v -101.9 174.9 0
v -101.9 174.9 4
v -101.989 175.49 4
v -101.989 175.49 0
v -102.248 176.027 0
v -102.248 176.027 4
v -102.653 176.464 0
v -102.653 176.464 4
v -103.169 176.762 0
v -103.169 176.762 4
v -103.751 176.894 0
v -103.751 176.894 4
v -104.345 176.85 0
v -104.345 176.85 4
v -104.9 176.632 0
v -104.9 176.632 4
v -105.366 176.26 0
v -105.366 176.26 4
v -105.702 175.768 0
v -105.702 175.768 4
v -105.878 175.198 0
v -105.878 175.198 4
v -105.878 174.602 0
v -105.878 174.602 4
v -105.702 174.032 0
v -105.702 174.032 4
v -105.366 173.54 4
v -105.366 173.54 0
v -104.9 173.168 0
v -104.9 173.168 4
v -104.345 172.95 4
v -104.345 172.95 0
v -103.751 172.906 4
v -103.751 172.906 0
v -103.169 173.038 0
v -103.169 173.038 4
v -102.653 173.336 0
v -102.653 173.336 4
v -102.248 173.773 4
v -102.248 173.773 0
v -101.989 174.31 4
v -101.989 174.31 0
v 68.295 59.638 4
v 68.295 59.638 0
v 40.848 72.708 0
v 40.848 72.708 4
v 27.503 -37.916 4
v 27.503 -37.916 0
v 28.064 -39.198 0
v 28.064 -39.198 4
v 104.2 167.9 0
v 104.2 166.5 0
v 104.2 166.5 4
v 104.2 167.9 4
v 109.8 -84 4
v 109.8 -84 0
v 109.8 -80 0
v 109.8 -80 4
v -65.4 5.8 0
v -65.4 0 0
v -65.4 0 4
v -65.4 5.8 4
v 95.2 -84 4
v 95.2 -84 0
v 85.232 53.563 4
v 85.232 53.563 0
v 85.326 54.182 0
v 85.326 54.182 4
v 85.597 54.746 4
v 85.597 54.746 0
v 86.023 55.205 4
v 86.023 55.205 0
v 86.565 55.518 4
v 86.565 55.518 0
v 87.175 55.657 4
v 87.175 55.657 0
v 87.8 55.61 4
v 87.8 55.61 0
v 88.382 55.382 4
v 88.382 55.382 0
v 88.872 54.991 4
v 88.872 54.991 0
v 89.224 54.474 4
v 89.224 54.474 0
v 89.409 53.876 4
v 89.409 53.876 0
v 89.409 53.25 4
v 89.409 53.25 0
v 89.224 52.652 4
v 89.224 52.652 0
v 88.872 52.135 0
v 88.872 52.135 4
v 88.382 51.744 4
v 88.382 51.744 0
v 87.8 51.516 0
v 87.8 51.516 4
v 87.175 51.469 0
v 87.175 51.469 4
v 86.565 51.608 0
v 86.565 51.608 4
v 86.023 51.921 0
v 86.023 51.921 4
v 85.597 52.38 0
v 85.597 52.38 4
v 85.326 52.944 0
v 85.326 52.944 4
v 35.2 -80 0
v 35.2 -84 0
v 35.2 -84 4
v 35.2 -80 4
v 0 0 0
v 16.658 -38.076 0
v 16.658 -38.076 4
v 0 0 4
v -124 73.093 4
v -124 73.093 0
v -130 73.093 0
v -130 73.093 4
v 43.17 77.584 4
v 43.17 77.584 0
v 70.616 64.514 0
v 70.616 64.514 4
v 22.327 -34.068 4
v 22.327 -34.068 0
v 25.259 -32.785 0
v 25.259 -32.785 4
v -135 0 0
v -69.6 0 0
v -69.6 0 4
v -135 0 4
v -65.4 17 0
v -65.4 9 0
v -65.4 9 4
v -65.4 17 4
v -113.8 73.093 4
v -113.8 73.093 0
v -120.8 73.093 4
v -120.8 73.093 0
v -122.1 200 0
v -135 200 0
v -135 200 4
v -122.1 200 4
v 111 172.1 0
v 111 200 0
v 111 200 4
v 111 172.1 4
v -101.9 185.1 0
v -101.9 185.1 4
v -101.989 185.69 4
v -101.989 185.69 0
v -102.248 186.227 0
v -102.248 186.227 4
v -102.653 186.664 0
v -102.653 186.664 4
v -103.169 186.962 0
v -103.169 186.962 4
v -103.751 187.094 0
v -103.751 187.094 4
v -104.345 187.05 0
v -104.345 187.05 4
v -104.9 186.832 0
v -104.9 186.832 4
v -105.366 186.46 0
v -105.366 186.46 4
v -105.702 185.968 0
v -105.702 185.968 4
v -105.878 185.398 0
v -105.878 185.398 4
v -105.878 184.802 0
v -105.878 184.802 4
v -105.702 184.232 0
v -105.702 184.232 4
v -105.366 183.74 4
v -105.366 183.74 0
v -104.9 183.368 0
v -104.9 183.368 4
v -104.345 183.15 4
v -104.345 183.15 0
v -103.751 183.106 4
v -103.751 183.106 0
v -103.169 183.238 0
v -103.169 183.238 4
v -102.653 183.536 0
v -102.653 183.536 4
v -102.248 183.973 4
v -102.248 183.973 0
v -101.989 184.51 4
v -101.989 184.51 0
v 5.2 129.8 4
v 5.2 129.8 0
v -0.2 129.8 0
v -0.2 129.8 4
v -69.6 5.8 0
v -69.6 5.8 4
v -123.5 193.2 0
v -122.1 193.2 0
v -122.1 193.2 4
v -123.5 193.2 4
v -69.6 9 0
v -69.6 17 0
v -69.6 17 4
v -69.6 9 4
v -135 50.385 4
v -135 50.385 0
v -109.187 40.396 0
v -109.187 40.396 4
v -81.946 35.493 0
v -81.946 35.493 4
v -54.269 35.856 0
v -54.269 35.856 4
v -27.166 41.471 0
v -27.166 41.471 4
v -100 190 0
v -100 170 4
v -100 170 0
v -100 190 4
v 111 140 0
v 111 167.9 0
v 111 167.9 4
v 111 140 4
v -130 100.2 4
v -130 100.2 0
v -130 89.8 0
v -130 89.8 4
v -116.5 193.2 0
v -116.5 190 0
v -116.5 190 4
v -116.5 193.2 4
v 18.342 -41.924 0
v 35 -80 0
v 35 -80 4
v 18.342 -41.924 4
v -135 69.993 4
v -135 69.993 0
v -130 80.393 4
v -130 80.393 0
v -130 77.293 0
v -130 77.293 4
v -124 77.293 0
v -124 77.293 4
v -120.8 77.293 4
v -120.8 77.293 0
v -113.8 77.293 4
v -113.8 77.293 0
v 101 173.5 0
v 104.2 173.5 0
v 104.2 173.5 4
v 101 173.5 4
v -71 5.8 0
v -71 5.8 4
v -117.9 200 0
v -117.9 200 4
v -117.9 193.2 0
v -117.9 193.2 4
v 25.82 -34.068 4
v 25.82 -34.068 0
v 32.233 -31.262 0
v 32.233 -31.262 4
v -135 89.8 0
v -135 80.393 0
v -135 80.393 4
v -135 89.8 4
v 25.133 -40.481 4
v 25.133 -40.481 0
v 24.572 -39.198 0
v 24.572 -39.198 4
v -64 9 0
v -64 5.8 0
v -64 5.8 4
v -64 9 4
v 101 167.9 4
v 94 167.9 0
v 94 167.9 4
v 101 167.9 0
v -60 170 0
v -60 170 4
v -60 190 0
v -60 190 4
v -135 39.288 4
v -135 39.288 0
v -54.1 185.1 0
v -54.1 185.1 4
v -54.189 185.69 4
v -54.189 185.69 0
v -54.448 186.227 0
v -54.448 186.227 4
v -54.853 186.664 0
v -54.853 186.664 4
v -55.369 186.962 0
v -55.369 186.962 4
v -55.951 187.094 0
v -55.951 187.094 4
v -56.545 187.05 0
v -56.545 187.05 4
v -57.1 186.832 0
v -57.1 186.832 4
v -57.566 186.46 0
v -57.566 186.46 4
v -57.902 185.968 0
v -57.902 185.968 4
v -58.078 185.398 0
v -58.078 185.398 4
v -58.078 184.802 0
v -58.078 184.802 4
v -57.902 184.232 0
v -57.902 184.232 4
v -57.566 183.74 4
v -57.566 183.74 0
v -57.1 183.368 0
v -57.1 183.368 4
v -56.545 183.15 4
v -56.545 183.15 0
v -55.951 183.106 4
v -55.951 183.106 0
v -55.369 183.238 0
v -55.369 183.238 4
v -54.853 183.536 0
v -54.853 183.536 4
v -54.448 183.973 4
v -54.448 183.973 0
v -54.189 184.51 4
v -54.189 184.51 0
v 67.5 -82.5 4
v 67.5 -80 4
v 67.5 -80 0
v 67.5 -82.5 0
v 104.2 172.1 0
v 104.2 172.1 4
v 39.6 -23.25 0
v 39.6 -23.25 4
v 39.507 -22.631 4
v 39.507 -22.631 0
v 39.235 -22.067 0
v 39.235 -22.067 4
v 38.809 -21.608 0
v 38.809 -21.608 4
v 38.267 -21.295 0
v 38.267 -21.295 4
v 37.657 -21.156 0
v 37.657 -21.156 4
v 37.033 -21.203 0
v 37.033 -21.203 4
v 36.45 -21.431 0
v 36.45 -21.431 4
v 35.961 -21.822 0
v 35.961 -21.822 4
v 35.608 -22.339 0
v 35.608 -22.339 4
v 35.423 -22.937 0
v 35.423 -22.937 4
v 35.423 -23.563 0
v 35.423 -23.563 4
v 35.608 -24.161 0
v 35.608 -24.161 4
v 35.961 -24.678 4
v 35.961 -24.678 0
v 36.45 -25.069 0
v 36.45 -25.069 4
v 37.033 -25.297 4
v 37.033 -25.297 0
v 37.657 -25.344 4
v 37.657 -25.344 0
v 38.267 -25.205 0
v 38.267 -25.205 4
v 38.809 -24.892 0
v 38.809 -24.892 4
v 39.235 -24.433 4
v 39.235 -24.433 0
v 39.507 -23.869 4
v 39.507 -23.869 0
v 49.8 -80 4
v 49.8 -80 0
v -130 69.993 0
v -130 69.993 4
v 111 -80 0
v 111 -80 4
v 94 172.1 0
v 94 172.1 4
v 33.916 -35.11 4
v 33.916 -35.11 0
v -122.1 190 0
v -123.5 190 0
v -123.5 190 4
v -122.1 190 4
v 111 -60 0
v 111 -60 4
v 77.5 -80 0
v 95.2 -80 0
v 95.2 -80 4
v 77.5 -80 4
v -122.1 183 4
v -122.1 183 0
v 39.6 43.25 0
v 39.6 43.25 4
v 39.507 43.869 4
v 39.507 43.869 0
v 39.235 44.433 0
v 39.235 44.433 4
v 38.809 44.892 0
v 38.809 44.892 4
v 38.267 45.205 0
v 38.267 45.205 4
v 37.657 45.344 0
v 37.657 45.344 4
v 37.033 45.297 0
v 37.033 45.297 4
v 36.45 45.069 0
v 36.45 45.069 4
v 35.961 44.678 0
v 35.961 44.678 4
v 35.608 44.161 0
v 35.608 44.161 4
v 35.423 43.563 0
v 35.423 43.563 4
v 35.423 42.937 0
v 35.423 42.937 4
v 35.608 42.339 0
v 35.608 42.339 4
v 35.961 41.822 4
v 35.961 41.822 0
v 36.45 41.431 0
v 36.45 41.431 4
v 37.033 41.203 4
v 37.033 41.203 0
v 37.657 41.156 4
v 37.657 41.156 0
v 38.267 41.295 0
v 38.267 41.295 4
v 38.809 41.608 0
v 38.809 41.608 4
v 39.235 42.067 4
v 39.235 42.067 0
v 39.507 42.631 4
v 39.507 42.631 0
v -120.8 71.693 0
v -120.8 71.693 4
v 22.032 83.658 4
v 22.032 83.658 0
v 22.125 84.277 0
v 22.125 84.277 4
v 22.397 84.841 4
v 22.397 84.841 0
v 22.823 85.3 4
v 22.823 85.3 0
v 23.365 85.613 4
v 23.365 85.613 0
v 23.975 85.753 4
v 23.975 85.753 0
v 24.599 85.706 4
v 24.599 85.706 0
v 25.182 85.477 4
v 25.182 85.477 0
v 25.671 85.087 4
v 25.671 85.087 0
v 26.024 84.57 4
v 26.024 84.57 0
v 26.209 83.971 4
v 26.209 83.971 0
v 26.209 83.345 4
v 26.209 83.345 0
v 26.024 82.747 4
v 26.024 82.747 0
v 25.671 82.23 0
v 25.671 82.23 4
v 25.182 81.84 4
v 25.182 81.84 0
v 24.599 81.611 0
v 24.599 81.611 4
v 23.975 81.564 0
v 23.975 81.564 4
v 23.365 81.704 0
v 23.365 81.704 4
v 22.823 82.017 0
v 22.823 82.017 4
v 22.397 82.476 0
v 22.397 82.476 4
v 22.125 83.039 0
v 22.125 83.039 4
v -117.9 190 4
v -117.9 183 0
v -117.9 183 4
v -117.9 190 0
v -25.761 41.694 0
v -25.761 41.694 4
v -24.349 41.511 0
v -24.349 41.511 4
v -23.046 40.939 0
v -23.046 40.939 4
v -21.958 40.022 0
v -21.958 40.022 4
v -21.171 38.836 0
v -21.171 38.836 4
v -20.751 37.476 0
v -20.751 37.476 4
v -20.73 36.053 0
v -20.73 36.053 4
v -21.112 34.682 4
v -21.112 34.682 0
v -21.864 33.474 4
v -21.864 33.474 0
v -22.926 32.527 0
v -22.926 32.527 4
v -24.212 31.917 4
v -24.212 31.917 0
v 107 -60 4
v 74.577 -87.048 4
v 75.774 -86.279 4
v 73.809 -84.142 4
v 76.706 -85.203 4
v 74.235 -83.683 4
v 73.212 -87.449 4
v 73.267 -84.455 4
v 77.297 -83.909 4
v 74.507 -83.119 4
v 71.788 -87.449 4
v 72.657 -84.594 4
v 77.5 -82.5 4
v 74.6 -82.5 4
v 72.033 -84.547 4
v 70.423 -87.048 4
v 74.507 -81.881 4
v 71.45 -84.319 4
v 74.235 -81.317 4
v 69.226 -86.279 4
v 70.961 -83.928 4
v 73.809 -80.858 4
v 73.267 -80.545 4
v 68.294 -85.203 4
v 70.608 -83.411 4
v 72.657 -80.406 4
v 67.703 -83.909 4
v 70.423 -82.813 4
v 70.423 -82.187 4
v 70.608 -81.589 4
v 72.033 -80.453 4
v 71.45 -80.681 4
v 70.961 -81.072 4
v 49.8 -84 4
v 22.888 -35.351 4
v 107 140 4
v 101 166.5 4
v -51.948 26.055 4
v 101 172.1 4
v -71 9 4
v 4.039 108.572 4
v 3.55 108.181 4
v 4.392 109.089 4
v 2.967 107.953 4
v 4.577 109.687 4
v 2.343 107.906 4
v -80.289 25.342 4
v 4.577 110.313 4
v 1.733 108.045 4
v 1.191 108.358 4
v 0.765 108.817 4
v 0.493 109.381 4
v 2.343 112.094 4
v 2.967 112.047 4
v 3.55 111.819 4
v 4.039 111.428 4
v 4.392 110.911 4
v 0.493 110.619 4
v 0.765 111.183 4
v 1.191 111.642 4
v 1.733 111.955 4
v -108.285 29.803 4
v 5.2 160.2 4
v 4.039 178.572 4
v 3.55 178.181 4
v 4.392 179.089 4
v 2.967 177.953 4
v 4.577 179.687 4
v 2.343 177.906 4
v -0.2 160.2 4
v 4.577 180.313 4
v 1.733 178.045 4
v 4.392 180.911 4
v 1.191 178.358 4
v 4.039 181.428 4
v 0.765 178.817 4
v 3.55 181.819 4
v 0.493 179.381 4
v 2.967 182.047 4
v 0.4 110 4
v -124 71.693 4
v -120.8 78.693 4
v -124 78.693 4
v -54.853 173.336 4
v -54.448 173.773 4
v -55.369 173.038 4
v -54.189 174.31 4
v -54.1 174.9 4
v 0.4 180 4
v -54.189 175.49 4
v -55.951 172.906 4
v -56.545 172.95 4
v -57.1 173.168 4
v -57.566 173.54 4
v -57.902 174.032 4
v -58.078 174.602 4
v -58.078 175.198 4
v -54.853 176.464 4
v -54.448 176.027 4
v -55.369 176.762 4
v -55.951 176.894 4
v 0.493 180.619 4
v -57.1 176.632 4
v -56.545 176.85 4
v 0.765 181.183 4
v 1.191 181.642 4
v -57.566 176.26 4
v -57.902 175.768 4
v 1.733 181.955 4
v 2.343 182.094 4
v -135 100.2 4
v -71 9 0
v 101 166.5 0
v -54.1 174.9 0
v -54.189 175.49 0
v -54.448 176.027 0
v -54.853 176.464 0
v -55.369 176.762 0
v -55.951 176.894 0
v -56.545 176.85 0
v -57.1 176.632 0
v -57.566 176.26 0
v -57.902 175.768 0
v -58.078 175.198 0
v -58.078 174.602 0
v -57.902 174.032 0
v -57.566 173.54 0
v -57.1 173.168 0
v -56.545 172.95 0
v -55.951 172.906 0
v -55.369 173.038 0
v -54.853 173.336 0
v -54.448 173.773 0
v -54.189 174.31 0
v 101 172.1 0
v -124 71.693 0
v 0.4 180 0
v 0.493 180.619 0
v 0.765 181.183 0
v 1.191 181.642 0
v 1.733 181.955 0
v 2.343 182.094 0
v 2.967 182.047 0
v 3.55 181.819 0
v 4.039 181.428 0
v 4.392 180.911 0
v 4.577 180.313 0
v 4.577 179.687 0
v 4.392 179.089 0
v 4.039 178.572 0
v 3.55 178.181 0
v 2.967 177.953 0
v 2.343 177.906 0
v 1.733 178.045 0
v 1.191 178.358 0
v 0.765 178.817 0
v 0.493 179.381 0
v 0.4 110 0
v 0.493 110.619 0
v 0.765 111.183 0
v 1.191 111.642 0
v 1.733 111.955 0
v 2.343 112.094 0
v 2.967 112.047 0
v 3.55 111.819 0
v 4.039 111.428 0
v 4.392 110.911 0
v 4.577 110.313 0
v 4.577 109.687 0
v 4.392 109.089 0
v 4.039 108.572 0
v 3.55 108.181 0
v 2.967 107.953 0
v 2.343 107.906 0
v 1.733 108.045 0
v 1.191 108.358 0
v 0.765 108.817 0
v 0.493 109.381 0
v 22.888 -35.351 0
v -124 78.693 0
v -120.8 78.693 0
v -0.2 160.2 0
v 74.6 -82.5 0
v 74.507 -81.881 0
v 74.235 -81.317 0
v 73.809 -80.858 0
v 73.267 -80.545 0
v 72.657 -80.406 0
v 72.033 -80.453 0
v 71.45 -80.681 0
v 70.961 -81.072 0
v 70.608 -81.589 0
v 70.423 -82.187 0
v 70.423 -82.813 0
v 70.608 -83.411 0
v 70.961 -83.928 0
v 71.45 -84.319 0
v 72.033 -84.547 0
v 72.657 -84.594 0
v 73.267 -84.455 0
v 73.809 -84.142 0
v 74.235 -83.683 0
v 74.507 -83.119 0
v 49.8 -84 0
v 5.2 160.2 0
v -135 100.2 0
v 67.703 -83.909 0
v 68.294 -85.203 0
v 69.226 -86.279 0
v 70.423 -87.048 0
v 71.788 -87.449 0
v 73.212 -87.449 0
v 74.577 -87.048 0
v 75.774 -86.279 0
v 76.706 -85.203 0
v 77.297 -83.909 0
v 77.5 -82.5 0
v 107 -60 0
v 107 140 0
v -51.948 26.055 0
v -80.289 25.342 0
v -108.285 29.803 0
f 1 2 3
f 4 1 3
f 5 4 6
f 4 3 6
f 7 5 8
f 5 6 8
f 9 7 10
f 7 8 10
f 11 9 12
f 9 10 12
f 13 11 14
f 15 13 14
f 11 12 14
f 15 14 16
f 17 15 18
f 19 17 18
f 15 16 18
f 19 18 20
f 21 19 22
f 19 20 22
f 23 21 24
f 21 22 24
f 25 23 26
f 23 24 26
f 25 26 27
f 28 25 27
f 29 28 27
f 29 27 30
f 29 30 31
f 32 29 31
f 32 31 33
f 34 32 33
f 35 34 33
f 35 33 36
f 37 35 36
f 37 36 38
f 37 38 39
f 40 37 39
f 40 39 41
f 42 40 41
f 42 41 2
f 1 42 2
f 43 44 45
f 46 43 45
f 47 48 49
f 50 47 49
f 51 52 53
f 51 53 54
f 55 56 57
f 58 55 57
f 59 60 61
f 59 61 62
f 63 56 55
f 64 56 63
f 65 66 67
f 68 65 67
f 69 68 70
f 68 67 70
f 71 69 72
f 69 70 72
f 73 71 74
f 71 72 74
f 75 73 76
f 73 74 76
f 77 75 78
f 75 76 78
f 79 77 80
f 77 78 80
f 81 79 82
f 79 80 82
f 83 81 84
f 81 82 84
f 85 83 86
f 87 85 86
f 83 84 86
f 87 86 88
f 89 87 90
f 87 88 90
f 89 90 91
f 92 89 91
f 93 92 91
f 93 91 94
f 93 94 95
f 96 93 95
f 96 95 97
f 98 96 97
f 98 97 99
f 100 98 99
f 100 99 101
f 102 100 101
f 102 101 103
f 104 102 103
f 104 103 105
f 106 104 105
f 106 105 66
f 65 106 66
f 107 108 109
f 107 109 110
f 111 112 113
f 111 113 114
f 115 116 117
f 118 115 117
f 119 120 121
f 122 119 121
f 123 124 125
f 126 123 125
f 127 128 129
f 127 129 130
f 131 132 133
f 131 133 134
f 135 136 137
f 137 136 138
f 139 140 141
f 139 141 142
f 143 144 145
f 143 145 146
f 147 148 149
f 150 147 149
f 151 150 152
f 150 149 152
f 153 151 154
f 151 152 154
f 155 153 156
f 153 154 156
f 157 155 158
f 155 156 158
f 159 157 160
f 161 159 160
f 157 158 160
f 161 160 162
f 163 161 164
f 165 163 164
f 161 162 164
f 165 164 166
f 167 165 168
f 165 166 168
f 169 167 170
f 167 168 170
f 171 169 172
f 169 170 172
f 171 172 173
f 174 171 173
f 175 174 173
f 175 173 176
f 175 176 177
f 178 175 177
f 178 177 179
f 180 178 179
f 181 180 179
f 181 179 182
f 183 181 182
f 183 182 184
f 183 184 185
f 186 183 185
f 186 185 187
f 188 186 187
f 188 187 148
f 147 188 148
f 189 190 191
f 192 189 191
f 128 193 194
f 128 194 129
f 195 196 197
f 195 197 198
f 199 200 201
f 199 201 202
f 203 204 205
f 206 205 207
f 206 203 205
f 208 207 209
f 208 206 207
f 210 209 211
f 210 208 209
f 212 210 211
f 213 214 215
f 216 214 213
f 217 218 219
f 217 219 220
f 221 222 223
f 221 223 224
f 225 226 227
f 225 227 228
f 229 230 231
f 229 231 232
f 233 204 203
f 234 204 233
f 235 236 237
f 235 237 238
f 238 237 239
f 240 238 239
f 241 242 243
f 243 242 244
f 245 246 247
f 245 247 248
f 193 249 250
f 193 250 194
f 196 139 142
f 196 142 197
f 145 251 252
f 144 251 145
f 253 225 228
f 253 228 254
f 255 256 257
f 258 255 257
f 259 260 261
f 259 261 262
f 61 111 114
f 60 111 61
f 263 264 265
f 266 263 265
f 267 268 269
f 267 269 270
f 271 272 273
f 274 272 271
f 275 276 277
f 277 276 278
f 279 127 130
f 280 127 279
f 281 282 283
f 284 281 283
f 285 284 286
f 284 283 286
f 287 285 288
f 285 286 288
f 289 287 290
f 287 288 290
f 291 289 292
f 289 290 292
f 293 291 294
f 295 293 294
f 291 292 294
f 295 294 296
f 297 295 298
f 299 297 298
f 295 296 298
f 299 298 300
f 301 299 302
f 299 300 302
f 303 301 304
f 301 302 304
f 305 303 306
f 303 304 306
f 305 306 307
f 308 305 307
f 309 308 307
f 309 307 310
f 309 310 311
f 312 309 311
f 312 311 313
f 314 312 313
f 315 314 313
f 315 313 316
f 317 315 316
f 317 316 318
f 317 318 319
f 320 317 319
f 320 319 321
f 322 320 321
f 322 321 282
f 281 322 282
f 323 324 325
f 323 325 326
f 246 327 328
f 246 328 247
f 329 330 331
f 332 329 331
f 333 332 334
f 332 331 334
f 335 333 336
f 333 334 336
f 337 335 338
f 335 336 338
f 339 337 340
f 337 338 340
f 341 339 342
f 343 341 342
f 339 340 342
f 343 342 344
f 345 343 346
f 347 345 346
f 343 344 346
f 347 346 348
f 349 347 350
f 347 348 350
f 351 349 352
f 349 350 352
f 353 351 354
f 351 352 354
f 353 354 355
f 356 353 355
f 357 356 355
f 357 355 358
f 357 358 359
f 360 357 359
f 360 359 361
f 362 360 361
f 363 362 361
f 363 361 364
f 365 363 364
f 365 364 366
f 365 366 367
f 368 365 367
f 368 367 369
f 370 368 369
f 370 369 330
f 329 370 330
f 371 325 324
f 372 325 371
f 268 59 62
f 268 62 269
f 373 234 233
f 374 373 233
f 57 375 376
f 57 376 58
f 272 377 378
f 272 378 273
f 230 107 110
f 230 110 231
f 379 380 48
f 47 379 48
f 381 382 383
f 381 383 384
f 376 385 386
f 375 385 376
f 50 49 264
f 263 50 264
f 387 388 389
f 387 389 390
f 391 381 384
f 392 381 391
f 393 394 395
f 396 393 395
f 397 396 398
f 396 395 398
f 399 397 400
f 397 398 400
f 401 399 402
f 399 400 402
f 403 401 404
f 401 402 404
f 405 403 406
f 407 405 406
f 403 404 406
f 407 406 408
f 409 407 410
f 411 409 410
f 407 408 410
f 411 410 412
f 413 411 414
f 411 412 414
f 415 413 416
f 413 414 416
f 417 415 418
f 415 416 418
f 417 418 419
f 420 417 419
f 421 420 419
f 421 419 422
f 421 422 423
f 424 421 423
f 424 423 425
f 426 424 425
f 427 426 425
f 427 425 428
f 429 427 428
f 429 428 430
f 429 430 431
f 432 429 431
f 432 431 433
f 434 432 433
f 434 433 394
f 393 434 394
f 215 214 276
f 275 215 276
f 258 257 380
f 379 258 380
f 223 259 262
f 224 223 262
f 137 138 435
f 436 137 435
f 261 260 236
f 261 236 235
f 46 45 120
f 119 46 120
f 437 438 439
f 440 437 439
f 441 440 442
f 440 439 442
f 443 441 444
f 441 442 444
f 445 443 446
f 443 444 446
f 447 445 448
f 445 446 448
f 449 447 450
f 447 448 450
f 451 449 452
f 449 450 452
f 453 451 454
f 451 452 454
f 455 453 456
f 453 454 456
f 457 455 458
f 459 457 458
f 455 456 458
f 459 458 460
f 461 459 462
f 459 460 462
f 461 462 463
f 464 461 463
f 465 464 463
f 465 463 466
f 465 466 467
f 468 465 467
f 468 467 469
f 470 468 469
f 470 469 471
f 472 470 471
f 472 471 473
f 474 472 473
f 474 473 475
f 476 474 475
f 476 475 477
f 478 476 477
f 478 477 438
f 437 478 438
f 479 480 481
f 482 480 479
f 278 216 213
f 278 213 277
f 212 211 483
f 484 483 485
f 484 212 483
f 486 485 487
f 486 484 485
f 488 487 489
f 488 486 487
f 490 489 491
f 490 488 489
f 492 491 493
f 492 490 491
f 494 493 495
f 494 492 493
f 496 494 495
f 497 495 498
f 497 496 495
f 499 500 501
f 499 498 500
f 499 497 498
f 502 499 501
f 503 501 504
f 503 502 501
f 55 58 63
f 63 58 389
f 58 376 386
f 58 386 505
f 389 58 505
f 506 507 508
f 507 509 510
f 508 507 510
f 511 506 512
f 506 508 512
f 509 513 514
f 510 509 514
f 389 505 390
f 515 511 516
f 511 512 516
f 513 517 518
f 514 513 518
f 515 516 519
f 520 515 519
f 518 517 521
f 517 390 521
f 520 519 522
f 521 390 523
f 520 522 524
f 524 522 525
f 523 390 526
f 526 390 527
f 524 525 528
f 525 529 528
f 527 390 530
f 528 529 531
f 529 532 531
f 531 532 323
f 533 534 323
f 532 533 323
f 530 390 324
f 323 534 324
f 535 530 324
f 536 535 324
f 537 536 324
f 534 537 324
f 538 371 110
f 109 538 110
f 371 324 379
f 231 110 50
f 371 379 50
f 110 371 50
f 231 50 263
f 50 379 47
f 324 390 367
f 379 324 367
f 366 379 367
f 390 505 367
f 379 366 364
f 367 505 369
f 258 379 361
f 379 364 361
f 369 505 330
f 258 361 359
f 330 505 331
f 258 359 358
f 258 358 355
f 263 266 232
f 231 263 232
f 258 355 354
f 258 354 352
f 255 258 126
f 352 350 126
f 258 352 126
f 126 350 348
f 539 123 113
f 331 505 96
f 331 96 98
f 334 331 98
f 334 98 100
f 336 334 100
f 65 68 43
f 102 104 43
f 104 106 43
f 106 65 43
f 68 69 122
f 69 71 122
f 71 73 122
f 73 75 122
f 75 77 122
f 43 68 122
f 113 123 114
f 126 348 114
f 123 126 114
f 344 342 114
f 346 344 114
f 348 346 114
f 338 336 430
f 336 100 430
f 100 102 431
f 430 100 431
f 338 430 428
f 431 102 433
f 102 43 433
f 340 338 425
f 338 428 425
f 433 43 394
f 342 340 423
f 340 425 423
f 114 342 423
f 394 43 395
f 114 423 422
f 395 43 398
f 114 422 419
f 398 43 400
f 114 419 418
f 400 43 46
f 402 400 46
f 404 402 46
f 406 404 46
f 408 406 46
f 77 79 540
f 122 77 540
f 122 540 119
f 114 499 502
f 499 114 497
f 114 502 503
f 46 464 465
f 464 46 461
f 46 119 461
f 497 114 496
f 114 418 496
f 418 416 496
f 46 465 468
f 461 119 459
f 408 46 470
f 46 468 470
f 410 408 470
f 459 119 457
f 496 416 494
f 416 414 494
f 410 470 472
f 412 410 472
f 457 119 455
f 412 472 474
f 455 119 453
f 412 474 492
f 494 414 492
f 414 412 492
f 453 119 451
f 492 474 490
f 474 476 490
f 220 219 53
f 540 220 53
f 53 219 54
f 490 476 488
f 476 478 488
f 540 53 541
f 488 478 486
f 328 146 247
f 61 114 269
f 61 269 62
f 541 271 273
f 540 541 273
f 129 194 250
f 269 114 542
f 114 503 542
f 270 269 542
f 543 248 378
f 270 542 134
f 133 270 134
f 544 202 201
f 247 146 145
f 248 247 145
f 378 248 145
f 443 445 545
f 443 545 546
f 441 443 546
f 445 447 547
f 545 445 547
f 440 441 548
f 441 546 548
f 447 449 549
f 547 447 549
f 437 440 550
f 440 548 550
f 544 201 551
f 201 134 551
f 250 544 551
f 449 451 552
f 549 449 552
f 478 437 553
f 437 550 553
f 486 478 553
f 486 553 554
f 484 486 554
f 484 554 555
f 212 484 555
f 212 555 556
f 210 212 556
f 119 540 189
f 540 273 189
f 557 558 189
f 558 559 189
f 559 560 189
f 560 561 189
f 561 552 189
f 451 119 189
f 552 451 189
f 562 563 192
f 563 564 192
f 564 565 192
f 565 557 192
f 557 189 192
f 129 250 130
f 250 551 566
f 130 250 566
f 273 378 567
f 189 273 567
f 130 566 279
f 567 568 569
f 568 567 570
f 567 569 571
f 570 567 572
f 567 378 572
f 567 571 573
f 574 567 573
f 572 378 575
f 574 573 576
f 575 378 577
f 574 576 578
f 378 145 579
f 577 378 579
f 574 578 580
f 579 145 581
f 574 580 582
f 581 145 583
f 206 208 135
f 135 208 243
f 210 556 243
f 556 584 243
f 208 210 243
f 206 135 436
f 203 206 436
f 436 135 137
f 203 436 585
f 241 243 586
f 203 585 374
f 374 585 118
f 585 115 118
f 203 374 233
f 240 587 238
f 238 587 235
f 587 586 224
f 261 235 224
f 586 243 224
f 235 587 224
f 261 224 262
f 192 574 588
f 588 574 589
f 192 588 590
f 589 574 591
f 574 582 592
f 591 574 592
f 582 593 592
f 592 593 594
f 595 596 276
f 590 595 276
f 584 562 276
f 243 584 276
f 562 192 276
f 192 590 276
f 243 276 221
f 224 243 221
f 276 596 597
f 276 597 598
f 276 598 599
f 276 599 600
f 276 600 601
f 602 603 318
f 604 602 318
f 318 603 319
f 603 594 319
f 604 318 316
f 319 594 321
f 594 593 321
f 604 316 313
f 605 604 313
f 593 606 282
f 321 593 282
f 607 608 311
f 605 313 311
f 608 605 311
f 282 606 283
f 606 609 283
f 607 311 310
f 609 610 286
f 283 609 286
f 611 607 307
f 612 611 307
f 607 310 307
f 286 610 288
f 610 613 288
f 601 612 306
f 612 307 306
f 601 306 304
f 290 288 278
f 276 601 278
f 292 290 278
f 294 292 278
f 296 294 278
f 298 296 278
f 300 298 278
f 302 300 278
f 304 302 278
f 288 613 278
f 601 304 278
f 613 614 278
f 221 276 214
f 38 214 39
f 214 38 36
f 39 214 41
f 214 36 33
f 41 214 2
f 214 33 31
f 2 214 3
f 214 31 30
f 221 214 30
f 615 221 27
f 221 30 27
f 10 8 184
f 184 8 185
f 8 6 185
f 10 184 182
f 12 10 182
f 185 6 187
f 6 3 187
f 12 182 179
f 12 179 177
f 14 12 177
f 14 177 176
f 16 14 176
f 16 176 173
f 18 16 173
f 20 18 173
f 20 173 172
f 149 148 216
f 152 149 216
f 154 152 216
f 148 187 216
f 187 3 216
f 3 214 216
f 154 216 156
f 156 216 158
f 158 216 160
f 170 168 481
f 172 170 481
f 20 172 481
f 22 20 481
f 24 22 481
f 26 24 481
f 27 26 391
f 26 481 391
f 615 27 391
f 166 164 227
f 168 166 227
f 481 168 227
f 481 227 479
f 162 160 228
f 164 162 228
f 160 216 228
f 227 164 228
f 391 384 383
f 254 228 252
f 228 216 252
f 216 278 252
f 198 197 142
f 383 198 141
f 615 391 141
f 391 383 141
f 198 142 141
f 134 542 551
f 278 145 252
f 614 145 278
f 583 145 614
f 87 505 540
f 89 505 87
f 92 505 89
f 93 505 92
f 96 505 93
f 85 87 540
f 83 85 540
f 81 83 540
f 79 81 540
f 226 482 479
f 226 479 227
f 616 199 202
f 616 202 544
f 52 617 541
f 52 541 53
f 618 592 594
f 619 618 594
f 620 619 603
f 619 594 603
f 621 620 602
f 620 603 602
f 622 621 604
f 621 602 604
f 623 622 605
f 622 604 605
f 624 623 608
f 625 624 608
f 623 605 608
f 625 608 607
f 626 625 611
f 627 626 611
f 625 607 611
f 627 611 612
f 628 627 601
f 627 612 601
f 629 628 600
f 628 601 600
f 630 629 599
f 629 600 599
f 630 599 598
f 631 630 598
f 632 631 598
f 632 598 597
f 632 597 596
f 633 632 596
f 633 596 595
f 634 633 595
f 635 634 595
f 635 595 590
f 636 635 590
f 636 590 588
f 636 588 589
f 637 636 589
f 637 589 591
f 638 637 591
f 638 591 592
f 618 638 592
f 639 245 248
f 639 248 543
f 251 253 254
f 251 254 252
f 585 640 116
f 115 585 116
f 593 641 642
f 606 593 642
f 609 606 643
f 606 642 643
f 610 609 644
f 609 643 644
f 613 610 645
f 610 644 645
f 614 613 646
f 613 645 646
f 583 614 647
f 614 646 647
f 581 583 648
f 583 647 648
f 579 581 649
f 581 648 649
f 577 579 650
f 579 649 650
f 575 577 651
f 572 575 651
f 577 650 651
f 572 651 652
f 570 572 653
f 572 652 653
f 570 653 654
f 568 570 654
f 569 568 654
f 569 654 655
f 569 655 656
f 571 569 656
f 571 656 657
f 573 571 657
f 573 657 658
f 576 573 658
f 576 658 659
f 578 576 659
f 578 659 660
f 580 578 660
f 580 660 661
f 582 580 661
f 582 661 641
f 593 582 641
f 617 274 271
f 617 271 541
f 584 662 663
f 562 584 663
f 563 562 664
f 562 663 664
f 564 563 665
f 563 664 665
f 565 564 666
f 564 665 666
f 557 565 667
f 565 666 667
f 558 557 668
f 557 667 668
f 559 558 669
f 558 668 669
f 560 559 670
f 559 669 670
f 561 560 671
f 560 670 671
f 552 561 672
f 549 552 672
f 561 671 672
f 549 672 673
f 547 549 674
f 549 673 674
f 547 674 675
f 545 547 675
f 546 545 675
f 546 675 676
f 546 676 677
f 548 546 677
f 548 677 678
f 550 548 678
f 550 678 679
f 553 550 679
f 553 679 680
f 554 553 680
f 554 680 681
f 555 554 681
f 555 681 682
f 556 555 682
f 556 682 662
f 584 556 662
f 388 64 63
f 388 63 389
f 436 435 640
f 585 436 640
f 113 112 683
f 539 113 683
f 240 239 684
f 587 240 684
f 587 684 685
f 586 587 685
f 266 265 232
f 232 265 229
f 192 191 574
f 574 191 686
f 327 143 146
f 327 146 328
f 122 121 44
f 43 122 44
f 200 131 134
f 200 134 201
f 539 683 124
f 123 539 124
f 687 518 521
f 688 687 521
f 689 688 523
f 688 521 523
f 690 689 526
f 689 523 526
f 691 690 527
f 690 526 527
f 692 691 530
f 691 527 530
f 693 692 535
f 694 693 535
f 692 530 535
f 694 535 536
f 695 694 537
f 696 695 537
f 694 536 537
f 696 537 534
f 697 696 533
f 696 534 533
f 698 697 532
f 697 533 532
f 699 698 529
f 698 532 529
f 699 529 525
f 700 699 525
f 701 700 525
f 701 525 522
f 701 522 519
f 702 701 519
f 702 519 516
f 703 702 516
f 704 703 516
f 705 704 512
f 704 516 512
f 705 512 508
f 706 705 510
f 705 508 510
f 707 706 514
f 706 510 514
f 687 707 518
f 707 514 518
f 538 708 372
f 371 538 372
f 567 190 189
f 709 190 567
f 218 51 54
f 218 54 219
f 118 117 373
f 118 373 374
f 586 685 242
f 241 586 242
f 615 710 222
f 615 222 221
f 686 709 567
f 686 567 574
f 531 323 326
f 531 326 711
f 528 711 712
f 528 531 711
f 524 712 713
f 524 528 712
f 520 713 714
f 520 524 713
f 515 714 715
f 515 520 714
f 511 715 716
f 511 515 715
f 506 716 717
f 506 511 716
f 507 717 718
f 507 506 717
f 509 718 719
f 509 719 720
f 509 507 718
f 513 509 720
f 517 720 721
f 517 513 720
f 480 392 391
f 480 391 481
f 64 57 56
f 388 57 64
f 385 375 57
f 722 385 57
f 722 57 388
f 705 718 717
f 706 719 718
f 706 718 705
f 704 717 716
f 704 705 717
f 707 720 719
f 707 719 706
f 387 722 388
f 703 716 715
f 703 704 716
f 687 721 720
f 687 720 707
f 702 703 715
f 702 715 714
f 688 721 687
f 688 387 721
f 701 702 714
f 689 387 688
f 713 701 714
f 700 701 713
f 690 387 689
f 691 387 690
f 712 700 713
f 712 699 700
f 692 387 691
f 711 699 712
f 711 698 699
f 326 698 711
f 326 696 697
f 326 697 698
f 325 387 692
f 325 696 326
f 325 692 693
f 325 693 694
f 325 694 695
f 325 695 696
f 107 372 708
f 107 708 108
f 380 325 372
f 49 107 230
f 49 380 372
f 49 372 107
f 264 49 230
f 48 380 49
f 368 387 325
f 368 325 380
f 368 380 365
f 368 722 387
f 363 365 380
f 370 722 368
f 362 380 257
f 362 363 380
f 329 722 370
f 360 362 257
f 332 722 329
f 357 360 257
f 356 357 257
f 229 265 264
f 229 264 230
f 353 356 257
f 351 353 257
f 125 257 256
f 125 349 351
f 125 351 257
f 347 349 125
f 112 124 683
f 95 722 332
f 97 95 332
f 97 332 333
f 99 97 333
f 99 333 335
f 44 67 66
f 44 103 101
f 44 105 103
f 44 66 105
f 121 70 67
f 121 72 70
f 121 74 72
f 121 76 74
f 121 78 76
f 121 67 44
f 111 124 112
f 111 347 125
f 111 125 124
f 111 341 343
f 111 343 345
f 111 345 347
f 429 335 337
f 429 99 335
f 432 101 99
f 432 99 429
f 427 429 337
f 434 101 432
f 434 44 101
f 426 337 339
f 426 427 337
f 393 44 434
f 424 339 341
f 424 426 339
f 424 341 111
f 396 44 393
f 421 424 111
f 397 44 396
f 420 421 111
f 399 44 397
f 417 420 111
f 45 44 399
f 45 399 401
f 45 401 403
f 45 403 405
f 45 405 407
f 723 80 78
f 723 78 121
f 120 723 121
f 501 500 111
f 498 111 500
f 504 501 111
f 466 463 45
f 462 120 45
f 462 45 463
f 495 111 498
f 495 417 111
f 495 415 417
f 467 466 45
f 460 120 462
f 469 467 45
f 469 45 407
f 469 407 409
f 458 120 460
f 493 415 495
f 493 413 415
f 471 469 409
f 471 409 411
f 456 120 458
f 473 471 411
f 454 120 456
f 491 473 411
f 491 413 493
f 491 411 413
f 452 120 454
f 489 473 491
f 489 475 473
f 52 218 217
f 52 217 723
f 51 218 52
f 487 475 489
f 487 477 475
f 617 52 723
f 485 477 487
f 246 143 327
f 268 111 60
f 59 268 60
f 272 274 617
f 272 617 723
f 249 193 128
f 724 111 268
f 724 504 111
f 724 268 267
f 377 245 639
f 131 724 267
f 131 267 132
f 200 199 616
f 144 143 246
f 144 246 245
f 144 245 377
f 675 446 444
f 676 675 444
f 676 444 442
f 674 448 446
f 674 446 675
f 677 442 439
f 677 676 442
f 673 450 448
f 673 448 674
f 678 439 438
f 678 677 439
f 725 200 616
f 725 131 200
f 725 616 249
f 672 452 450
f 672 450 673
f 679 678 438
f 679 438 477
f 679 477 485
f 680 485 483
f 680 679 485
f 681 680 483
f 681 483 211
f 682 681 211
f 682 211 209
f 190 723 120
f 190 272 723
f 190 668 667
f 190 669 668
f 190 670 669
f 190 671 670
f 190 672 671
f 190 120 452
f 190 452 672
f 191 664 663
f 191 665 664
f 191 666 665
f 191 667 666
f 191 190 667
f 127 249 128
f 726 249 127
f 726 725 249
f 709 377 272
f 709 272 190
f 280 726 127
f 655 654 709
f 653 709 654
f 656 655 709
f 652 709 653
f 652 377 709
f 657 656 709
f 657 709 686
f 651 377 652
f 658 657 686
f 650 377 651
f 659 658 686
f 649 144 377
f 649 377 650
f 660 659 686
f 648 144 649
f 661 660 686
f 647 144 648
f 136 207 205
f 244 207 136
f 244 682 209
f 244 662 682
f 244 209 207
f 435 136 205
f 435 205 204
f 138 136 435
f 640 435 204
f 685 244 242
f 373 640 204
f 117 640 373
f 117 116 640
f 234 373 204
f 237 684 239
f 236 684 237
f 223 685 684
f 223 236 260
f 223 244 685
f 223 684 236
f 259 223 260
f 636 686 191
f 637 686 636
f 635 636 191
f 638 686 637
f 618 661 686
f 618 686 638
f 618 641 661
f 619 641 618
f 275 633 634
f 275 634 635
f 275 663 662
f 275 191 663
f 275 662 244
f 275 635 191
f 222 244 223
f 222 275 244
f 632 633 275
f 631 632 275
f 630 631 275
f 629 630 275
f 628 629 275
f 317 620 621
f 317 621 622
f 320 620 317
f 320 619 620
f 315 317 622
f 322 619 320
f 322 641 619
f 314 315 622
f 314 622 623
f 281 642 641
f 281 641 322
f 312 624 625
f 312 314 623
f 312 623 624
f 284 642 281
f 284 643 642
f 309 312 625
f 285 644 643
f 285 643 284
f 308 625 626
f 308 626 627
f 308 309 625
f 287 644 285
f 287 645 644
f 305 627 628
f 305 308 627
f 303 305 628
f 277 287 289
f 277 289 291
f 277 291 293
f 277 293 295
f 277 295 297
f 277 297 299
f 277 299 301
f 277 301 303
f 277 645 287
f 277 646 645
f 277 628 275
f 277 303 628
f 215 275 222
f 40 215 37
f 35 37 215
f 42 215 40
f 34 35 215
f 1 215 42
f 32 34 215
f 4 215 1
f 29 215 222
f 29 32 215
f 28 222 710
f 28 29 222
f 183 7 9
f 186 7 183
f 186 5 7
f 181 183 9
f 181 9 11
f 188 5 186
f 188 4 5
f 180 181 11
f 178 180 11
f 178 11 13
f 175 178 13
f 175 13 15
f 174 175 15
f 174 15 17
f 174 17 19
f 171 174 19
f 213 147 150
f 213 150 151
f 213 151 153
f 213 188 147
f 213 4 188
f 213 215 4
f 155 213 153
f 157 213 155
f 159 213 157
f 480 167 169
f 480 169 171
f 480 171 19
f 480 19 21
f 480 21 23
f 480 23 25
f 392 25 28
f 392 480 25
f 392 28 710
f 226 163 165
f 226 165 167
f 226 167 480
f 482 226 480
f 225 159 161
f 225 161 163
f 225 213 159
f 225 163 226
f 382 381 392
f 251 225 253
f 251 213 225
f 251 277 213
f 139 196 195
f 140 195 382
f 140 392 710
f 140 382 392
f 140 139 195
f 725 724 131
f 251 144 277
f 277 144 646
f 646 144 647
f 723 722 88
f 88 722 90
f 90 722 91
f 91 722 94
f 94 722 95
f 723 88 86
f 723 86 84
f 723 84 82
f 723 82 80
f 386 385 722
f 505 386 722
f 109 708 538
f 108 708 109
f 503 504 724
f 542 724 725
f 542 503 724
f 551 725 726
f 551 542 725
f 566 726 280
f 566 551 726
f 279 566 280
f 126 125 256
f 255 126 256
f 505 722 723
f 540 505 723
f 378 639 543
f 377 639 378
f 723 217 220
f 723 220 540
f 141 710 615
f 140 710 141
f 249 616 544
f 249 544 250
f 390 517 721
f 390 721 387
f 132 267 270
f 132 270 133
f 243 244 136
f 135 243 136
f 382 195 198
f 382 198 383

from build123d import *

# Parameters (mm, degrees)
BOSS_EXTRU_1_DEPTH       = 4
ENL_V_MAT_EXTRU_3_DEPTH  = 10
ESQUISSE3_R              = 2
ESQUISSE3_W              = 40
ESQUISSE3_H              = 20
ENL_V_MAT_EXTRU_4_DEPTH  = 242.33172191
ESQUISSE4_W              = 4
ESQUISSE4_H              = 200
ENL_V_MAT_EXTRU_5_DEPTH  = 242.33172191
ESQUISSE5_R              = 2.1
ENL_V_MAT_EXTRU_6_DEPTH  = 242.33172191
ESQUISSE8_W              = 5.4
ESQUISSE8_H              = 30.4
ENL_V_MAT_EXTRU_8_DEPTH  = 242.33172191
ESQUISSE10_W             = 4.4
ESQUISSE10_H             = 10.4
ENL_V_MAT_EXTRU_9_DEPTH  = 5
ESQUISSE12_R             = 2.1
BOSS_EXTRU_2_DEPTH       = 4
ESQUISSE14_W             = 14.6
ESQUISSE14_H             = 4
BOSS_EXTRU_3_DEPTH       = 4
ENL_V_MAT_EXTRU_11_DEPTH = 242.33172191
ENL_V_MAT_EXTRU_12_DEPTH = 242.33172191
ENL_V_MAT_EXTRU_13_DEPTH = 242.33172191
ENL_V_MAT_EXTRU_14_DEPTH = 242.33172191
ESQUISSE19_R             = 2.1
ENL_V_MAT_EXTRU_15_DEPTH = 242.33172191
ENL_V_MAT_EXTRU_16_DEPTH = 242.33172191


with BuildPart() as part:
    # Esquisse1 → Boss.-Extru.1 (new body)
    with BuildSketch(Plane.XY):
        Polygon((0, 0), (-135, 0), (-135, 200), (111, 200), (111, -80), (35, -80), align=None)
    extrude(amount=BOSS_EXTRU_1_DEPTH)

    # Esquisse2 → Enl_v. mat.-Extru.3 (cut)
    with BuildSketch(Plane(origin=(-100, 38, 4), x_dir=(-1, 0, 0), z_dir=(0, 0, -1))):
        with BuildLine():
            ThreePointArc((-75.787868531, -6.082649542), (-15.633697972, -12.332787722), (42.333333333, 4.912841999))
            ThreePointArc((42.333333333, 4.912841999), (44.422166387, 11.668341719), (37.666666667, 13.757174773))
            ThreePointArc((37.666666667, 13.757174773), (-16.560556167, -2.375833675), (-72.833812496, 3.471069783))
            ThreePointArc((-72.833812496, 3.471069783), (-79.087700176, 0.171238138), (-75.787868531, -6.082649542))
        make_face()
    extrude(amount=ENL_V_MAT_EXTRU_3_DEPTH, mode=Mode.SUBTRACT)

    # Esquisse3 → Enl_v. mat.-Extru.4 (cut, through all)
    with BuildSketch(Plane.XY.offset(4)):
        with Locations((-103.9, 185.1)):
            Circle(ESQUISSE3_R)
        with Locations((-103.9, 174.9)):
            Circle(ESQUISSE3_R)
        with Locations((-56.1, 185.1)):
            Circle(ESQUISSE3_R)
        with Locations((-56.1, 174.9)):
            Circle(ESQUISSE3_R)
        with Locations((-80, 180)):
            Rectangle(ESQUISSE3_W, ESQUISSE3_H)
    extrude(amount=-ENL_V_MAT_EXTRU_4_DEPTH, mode=Mode.SUBTRACT)

    # Esquisse4 → Enl_v. mat.-Extru.5 (cut, through all)
    with BuildSketch(Plane(origin=(0, 0, 0), x_dir=(-1, 0, 0), z_dir=(0, 0, -1))):
        with Locations((-109, 40)):
            Rectangle(ESQUISSE4_W, ESQUISSE4_H)
    extrude(amount=-ENL_V_MAT_EXTRU_5_DEPTH, mode=Mode.SUBTRACT)

    # Esquisse5 → Enl_v. mat.-Extru.6 (cut, through all)
    with BuildSketch(Plane(origin=(0, 0, 0), x_dir=(-1, 0, 0), z_dir=(0, 0, -1))):
        with Locations((-2.5, 180)):
            Circle(ESQUISSE5_R)
        with Locations((-2.5, 110)):
            Circle(ESQUISSE5_R)
        with Locations((-24.132044328, 83.658479689)):
            Circle(ESQUISSE5_R)
        with Locations((-87.332280645, 53.563129062)):
            Circle(ESQUISSE5_R)
    extrude(amount=-ENL_V_MAT_EXTRU_6_DEPTH, mode=Mode.SUBTRACT)

    # Esquisse8 → Enl_v. mat.-Extru.8 (cut, through all)
    with BuildSketch(Plane(origin=(0, 0, 0), x_dir=(-1, 0, 0), z_dir=(0, 0, -1))):
        Polygon((-40.847861933, 72.708071397), (-43.169503267, 77.583518198), (-70.616463039, 64.513537354), (-68.294821705, 59.638090553), align=None)
        with Locations((-2.5, 145)):
            Rectangle(ESQUISSE8_W, ESQUISSE8_H)
    extrude(amount=-ENL_V_MAT_EXTRU_8_DEPTH, mode=Mode.SUBTRACT)

    # Esquisse10 → Enl_v. mat.-Extru.9 (cut)
    with BuildSketch(Plane.ZY.offset(135)):
        with Locations((2, 95)):
            Rectangle(ESQUISSE10_W, ESQUISSE10_H)
        with Locations((2, 75.192593016)):
            Rectangle(ESQUISSE10_W, ESQUISSE10_H)
    extrude(amount=-ENL_V_MAT_EXTRU_9_DEPTH, mode=Mode.SUBTRACT)

    # Esquisse12 → Boss.-Extru.2 (add)
    with BuildSketch(Plane.XY.offset(4)):
        with BuildLine():
            Line((67.5, -80), (67.5, -82.5))
            ThreePointArc((67.5, -82.5), (72.5, -87.5), (77.5, -82.5))
            Line((77.5, -82.5), (77.5, -80))
            Line((77.5, -80), (67.5, -80))
        make_face()
        with Locations((72.5, -82.5)):
            Circle(ESQUISSE12_R, mode=Mode.SUBTRACT)
    extrude(amount=-BOSS_EXTRU_2_DEPTH)

    # Esquisse14 → Boss.-Extru.3 (add)
    with BuildSketch(Plane(origin=(0, 0, 0), x_dir=(-1, 0, 0), z_dir=(0, 0, -1))):
        with Locations((-42.5, -82)):
            Rectangle(ESQUISSE14_W, ESQUISSE14_H)
        with Locations((-102.5, -82)):
            Rectangle(ESQUISSE14_W, ESQUISSE14_H)
    extrude(amount=-BOSS_EXTRU_3_DEPTH)

    # Esquisse15 → Enl_v. mat.-Extru.11 (cut, through all)
    with BuildSketch(Plane(origin=(0, 0, 0), x_dir=(-1, 0, 0), z_dir=(0, 0, -1))):
        Polygon((-18.341719551, -41.923930403), (-16.658280449, -38.076069597), (-22.888150326, -35.350501525), (-22.327003958, -34.067881257), (-25.25870743, -32.785260988), (-25.819853798, -34.067881257), (-32.232955142, -31.262149418), (-33.916394245, -35.110010225), (-27.5032929, -37.915742063), (-28.064439268, -39.198362332), (-25.132735796, -40.480982601), (-24.571589429, -39.198362332), align=None)
    extrude(amount=-ENL_V_MAT_EXTRU_11_DEPTH, mode=Mode.SUBTRACT)

    # Esquisse16 → Enl_v. mat.-Extru.12 (cut, through all)
    with BuildSketch(Plane(origin=(0, 0, 0), x_dir=(-1, 0, 0), z_dir=(0, 0, -1))):
        Polygon((-111, 167.9), (-111, 172.1), (-104.2, 172.1), (-104.2, 173.5), (-101, 173.5), (-101, 172.1), (-94, 172.1), (-94, 167.9), (-101, 167.9), (-101, 166.5), (-104.2, 166.5), (-104.2, 167.9), align=None)
    extrude(amount=-ENL_V_MAT_EXTRU_12_DEPTH, mode=Mode.SUBTRACT)

    # Esquisse17 → Enl_v. mat.-Extru.13 (cut, through all)
    with BuildSketch(Plane(origin=(0, 0, 0), x_dir=(-1, 0, 0), z_dir=(0, 0, -1))):
        Polygon((69.6, 0), (65.4, 0), (65.4, 5.8), (64, 5.8), (64, 9), (65.4, 9), (65.4, 17), (69.6, 17), (69.6, 9), (71, 9), (71, 5.8), (69.6, 5.8), align=None)
    extrude(amount=-ENL_V_MAT_EXTRU_13_DEPTH, mode=Mode.SUBTRACT)

    # Esquisse18 → Enl_v. mat.-Extru.14 (cut, through all)
    with BuildSketch(Plane(origin=(0, 0, 0), x_dir=(-1, 0, 0), z_dir=(0, 0, -1))):
        Polygon((117.9, 200), (122.1, 200), (122.1, 193.2), (123.5, 193.2), (123.5, 190), (122.1, 190), (122.1, 183), (117.9, 183), (117.9, 190), (116.5, 190), (116.5, 193.2), (117.9, 193.2), align=None)
    extrude(amount=-ENL_V_MAT_EXTRU_14_DEPTH, mode=Mode.SUBTRACT)

    # Esquisse19 → Enl_v. mat.-Extru.15 (cut, through all)
    with BuildSketch(Plane.XY.offset(4)):
        with Locations((37.5, -23.25)):
            Circle(ESQUISSE19_R)
        with Locations((37.5, 43.25)):
            Circle(ESQUISSE19_R)
    extrude(amount=-ENL_V_MAT_EXTRU_15_DEPTH, mode=Mode.SUBTRACT)

    # Esquisse20 → Enl_v. mat.-Extru.16 (cut, through all)
    with BuildSketch(Plane(origin=(0, 0, 0), x_dir=(-1, 0, 0), z_dir=(0, 0, -1))):
        Polygon((130, 73.092593016), (130, 77.292593016), (124, 77.292593016), (124, 78.692593016), (120.8, 78.692593016), (120.8, 77.292593016), (113.8, 77.292593016), (113.8, 73.092593016), (120.8, 73.092593016), (120.8, 71.692593016), (124, 71.692593016), (124, 73.092593016), align=None)
    extrude(amount=-ENL_V_MAT_EXTRU_16_DEPTH, mode=Mode.SUBTRACT)


solid = part.part
